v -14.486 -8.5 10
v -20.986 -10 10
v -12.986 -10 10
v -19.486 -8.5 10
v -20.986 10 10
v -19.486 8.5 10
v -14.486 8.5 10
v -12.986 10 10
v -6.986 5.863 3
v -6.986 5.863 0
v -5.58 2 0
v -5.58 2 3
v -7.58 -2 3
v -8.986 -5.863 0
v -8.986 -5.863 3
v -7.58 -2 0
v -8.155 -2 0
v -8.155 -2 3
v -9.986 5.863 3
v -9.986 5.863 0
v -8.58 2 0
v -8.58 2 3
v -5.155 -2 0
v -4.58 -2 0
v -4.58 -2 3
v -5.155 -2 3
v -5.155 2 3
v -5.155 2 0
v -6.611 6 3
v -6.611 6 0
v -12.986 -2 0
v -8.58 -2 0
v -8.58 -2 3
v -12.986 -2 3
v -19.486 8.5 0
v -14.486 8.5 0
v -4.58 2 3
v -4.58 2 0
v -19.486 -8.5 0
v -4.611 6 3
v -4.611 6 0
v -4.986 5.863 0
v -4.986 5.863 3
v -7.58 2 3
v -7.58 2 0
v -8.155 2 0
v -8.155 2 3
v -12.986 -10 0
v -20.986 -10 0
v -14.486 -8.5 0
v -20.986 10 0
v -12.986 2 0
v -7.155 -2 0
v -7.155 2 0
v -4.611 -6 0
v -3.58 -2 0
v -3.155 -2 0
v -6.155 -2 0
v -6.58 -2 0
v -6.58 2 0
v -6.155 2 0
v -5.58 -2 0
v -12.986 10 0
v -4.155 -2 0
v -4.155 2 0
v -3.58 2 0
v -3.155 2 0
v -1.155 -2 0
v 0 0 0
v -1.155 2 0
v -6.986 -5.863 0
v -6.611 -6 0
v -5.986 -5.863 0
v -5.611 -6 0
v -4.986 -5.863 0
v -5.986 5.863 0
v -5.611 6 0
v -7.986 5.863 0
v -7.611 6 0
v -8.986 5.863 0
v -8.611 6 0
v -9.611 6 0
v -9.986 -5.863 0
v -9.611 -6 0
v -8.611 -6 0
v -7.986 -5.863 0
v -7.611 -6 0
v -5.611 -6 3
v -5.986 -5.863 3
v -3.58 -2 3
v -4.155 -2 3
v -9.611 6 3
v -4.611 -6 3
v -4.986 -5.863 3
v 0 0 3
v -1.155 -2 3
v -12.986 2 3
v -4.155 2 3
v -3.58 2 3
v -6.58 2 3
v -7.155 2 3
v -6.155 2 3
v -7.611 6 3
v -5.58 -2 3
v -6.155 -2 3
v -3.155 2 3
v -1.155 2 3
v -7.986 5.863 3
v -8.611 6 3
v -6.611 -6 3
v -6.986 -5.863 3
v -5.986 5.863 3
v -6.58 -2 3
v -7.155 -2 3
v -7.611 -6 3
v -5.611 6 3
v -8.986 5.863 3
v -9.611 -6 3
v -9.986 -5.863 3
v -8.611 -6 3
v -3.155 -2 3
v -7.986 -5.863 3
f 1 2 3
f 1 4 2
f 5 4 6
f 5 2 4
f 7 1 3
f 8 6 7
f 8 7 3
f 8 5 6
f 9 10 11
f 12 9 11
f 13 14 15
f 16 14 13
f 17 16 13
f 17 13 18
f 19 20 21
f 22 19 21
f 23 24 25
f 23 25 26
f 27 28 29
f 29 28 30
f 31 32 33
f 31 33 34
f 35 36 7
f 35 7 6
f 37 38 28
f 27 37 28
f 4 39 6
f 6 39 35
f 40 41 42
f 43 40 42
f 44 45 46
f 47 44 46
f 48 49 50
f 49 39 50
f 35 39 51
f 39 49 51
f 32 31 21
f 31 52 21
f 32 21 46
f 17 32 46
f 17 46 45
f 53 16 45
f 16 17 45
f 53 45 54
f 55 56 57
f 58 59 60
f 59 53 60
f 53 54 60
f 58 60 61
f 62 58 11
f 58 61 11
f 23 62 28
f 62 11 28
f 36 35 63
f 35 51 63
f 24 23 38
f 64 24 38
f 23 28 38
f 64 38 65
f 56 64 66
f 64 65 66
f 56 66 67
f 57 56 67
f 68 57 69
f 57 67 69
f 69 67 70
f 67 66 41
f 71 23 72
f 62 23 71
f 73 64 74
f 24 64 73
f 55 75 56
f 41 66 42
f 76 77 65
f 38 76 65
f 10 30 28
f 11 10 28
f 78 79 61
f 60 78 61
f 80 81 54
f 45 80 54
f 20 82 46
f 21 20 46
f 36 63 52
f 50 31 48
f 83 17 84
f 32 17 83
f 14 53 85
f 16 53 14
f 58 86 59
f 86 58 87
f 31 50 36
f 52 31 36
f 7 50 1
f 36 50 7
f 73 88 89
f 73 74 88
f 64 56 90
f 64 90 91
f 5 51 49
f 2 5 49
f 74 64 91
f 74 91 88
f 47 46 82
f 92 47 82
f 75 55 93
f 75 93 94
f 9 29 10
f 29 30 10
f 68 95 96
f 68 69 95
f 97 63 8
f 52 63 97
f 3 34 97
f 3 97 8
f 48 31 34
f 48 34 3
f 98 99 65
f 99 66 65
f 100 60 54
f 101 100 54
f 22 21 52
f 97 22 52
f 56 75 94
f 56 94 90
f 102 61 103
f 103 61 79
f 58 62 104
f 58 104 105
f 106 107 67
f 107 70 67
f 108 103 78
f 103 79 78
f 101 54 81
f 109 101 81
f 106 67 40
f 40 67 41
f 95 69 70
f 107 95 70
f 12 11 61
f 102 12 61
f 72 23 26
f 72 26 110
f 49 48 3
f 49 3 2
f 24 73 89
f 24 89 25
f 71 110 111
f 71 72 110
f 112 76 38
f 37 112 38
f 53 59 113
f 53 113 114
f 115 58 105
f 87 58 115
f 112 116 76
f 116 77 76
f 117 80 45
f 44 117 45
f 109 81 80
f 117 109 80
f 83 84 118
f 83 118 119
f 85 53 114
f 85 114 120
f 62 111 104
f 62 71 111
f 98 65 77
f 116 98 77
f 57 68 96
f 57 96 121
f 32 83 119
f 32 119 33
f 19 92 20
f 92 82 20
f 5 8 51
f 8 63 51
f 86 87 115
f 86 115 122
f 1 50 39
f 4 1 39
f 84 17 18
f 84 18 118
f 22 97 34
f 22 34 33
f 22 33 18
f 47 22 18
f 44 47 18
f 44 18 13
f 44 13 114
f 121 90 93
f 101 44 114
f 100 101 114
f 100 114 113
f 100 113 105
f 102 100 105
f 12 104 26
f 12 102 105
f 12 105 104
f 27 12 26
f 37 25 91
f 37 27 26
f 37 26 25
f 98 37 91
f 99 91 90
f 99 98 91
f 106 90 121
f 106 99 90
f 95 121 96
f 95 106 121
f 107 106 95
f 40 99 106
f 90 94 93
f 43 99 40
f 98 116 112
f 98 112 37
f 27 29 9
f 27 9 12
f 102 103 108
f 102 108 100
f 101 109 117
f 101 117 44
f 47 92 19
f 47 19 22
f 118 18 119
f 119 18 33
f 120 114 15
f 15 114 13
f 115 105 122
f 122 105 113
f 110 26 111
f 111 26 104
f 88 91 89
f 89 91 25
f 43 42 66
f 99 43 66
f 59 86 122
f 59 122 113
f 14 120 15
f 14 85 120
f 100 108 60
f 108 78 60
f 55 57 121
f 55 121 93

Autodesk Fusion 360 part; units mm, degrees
sketch "Sketch1" plane through (0, 0, 0) normal (0, 0, 1) x (1, 0, 0)
  line L0 (0, 0) -> (-24.511, 0)
  line L1 (0, 0) -> (-1.1547, 2)
  line L2 (-1.1547, 2) -> (-3.1547, 2)
  line L3 (-3.1547, 2) -> (-4.6106, 6)
  line L4 (-4.6106, 6) -> (-4.9865, 5.8632)
  line L5 (-4.9865, 5.8632) -> (-3.5804, 2)
  line L6 (-3.5804, 2) -> (-4.1547, 2)
  line L7 (-4.5804, 2) -> (-5.1547, 2)
  line L8 (-5.9865, 5.8632) -> (-4.5804, 2)
  line L9 (-5.6106, 6) -> (-5.9865, 5.8632)
  line L10 (-4.1547, 2) -> (-5.6106, 6)
  line L11 (-5.5804, 2) -> (-6.1547, 2)
  line L12 (-6.9865, 5.8632) -> (-5.5804, 2)
  line L13 (-6.6106, 6) -> (-6.9865, 5.8632)
  line L14 (-5.1547, 2) -> (-6.6106, 6)
  line L15 (-6.5804, 2) -> (-7.1547, 2)
  line L16 (-7.9865, 5.8632) -> (-6.5804, 2)
  line L17 (-7.6106, 6) -> (-7.9865, 5.8632)
  line L18 (-6.1547, 2) -> (-7.6106, 6)
  line L19 (-7.5804, 2) -> (-8.1547, 2)
  line L20 (-8.9865, 5.8632) -> (-7.5804, 2)
  line L21 (-8.6106, 6) -> (-8.9865, 5.8632)
  line L22 (-7.1547, 2) -> (-8.6106, 6)
  line L23 (-8.5804, 2) -> (-9.1547, 2)
  line L24 (-9.9865, 5.8632) -> (-8.5804, 2)
  line L25 (-9.6106, 6) -> (-9.9865, 5.8632)
  line L26 (-8.1547, 2) -> (-9.6106, 6)
  line L27 (-9.1547, 2) -> (-12.9865, 2)
  line L28 (-20.9865, 10) -> (-20.9865, 0)
  line L29 (-12.9865, 2) -> (-12.9865, 10)
  line L30 (-12.9865, 10) -> (-20.9865, 10)
  line L31 (-12.9865, 2) -> (-12.9865, 0)
  line L32 (-9.6106, -6) -> (-9.9865, -5.8632)
  line L33 (-9.9865, -5.8632) -> (-8.5804, -2)
  line L34 (-7.1547, -2) -> (-8.6106, -6)
  line L35 (-5.1547, -2) -> (-6.6106, -6)
  line L36 (-9.1547, -2) -> (-12.9865, -2)
  line L37 (-7.5804, -2) -> (-8.1547, -2)
  line L38 (-3.5804, -2) -> (-4.1547, -2)
  line L39 (-20.9865, -10) -> (-20.9865, 0)
  line L40 (-12.9865, -10) -> (-20.9865, -10)
  line L41 (0, 0) -> (-1.1547, -2)
  line L42 (-4.9865, -5.8632) -> (-3.5804, -2)
  line L43 (-5.6106, -6) -> (-5.9865, -5.8632)
  line L44 (-6.5804, -2) -> (-7.1547, -2)
  line L45 (-7.6106, -6) -> (-7.9865, -5.8632)
  line L46 (-12.9865, -2) -> (-12.9865, -10)
  line L47 (-8.5804, -2) -> (-9.1547, -2)
  line L48 (-6.6106, -6) -> (-6.9865, -5.8632)
  line L49 (-12.9865, -2) -> (-12.9865, 0)
  line L50 (-7.9865, -5.8632) -> (-6.5804, -2)
  line L51 (-8.6106, -6) -> (-8.9865, -5.8632)
  line L52 (-6.1547, -2) -> (-7.6106, -6)
  line L53 (-4.6106, -6) -> (-4.9865, -5.8632)
  line L54 (-3.1547, -2) -> (-4.6106, -6)
  line L55 (-8.9865, -5.8632) -> (-7.5804, -2)
  line L56 (-8.1547, -2) -> (-9.6106, -6)
  line L57 (-6.9865, -5.8632) -> (-5.5804, -2)
  line L58 (-4.1547, -2) -> (-5.6106, -6)
  line L59 (-1.1547, -2) -> (-3.1547, -2)
  line L60 (-5.9865, -5.8632) -> (-4.5804, -2)
  line L61 (-4.5804, -2) -> (-5.1547, -2)
  line L62 (-5.5804, -2) -> (-6.1547, -2)
  line L63 (-14.4865, 2) -> (-14.4865, 0)
  line L64 (-14.4865, -2) -> (-14.4865, 0)
  line L65 (-14.4865, -2) -> (-14.4865, -8.5)
  line L66 (-14.4865, -8.5) -> (-19.4865, -8.5)
  line L67 (-19.4865, -8.5) -> (-19.4865, 0)
  line L68 (-19.4865, 8.5) -> (-19.4865, 0)
  line L69 (-14.4865, 8.5) -> (-19.4865, 8.5)
  line L70 (-14.4865, 2) -> (-14.4865, 8.5)
  point P0 (-24.511, 0)
  dimension "d1" = 4
  dimension "d2" = 0.4
  dimension "d3" = 1
  dimension "d6" = -1
  dimension "d7" = 0
  dimension "d8" = 110
  dimension "d9" = 4
  dimension "d10" = 8
  dimension "d11" = 8
  dimension "d12" = 3
  dimension "d13" = 2
  dimension "d14" = 60
  dimension "d19" = 1.5
extrude "Extrude1" add sketch "Sketch1" along normal blind 3 contours L0 L32 L33 L34 L35 L36 L37 L38 L41 L42 L43 L44 L45 L47 L48 L49 L50 L51 L52 L53 L54 L55 L56 L57 L58 L59 L60 L61 L62 | L0 L1 L2 L3 L4 L5 L6 L7 L8 L9 L10 L11 L12 L13 L14 L15 L16 L17 L18 L19 L20 L21 L22 L23 L24 L25 L26 L27 L31
extrude "Extrude2" add sketch "Sketch1" along normal blind 10 contours L0 L39 L40 L46 L49 L64 L65 L66 L67 | L0 L28 L29 L30 L31 L63 L68 L69 L70
